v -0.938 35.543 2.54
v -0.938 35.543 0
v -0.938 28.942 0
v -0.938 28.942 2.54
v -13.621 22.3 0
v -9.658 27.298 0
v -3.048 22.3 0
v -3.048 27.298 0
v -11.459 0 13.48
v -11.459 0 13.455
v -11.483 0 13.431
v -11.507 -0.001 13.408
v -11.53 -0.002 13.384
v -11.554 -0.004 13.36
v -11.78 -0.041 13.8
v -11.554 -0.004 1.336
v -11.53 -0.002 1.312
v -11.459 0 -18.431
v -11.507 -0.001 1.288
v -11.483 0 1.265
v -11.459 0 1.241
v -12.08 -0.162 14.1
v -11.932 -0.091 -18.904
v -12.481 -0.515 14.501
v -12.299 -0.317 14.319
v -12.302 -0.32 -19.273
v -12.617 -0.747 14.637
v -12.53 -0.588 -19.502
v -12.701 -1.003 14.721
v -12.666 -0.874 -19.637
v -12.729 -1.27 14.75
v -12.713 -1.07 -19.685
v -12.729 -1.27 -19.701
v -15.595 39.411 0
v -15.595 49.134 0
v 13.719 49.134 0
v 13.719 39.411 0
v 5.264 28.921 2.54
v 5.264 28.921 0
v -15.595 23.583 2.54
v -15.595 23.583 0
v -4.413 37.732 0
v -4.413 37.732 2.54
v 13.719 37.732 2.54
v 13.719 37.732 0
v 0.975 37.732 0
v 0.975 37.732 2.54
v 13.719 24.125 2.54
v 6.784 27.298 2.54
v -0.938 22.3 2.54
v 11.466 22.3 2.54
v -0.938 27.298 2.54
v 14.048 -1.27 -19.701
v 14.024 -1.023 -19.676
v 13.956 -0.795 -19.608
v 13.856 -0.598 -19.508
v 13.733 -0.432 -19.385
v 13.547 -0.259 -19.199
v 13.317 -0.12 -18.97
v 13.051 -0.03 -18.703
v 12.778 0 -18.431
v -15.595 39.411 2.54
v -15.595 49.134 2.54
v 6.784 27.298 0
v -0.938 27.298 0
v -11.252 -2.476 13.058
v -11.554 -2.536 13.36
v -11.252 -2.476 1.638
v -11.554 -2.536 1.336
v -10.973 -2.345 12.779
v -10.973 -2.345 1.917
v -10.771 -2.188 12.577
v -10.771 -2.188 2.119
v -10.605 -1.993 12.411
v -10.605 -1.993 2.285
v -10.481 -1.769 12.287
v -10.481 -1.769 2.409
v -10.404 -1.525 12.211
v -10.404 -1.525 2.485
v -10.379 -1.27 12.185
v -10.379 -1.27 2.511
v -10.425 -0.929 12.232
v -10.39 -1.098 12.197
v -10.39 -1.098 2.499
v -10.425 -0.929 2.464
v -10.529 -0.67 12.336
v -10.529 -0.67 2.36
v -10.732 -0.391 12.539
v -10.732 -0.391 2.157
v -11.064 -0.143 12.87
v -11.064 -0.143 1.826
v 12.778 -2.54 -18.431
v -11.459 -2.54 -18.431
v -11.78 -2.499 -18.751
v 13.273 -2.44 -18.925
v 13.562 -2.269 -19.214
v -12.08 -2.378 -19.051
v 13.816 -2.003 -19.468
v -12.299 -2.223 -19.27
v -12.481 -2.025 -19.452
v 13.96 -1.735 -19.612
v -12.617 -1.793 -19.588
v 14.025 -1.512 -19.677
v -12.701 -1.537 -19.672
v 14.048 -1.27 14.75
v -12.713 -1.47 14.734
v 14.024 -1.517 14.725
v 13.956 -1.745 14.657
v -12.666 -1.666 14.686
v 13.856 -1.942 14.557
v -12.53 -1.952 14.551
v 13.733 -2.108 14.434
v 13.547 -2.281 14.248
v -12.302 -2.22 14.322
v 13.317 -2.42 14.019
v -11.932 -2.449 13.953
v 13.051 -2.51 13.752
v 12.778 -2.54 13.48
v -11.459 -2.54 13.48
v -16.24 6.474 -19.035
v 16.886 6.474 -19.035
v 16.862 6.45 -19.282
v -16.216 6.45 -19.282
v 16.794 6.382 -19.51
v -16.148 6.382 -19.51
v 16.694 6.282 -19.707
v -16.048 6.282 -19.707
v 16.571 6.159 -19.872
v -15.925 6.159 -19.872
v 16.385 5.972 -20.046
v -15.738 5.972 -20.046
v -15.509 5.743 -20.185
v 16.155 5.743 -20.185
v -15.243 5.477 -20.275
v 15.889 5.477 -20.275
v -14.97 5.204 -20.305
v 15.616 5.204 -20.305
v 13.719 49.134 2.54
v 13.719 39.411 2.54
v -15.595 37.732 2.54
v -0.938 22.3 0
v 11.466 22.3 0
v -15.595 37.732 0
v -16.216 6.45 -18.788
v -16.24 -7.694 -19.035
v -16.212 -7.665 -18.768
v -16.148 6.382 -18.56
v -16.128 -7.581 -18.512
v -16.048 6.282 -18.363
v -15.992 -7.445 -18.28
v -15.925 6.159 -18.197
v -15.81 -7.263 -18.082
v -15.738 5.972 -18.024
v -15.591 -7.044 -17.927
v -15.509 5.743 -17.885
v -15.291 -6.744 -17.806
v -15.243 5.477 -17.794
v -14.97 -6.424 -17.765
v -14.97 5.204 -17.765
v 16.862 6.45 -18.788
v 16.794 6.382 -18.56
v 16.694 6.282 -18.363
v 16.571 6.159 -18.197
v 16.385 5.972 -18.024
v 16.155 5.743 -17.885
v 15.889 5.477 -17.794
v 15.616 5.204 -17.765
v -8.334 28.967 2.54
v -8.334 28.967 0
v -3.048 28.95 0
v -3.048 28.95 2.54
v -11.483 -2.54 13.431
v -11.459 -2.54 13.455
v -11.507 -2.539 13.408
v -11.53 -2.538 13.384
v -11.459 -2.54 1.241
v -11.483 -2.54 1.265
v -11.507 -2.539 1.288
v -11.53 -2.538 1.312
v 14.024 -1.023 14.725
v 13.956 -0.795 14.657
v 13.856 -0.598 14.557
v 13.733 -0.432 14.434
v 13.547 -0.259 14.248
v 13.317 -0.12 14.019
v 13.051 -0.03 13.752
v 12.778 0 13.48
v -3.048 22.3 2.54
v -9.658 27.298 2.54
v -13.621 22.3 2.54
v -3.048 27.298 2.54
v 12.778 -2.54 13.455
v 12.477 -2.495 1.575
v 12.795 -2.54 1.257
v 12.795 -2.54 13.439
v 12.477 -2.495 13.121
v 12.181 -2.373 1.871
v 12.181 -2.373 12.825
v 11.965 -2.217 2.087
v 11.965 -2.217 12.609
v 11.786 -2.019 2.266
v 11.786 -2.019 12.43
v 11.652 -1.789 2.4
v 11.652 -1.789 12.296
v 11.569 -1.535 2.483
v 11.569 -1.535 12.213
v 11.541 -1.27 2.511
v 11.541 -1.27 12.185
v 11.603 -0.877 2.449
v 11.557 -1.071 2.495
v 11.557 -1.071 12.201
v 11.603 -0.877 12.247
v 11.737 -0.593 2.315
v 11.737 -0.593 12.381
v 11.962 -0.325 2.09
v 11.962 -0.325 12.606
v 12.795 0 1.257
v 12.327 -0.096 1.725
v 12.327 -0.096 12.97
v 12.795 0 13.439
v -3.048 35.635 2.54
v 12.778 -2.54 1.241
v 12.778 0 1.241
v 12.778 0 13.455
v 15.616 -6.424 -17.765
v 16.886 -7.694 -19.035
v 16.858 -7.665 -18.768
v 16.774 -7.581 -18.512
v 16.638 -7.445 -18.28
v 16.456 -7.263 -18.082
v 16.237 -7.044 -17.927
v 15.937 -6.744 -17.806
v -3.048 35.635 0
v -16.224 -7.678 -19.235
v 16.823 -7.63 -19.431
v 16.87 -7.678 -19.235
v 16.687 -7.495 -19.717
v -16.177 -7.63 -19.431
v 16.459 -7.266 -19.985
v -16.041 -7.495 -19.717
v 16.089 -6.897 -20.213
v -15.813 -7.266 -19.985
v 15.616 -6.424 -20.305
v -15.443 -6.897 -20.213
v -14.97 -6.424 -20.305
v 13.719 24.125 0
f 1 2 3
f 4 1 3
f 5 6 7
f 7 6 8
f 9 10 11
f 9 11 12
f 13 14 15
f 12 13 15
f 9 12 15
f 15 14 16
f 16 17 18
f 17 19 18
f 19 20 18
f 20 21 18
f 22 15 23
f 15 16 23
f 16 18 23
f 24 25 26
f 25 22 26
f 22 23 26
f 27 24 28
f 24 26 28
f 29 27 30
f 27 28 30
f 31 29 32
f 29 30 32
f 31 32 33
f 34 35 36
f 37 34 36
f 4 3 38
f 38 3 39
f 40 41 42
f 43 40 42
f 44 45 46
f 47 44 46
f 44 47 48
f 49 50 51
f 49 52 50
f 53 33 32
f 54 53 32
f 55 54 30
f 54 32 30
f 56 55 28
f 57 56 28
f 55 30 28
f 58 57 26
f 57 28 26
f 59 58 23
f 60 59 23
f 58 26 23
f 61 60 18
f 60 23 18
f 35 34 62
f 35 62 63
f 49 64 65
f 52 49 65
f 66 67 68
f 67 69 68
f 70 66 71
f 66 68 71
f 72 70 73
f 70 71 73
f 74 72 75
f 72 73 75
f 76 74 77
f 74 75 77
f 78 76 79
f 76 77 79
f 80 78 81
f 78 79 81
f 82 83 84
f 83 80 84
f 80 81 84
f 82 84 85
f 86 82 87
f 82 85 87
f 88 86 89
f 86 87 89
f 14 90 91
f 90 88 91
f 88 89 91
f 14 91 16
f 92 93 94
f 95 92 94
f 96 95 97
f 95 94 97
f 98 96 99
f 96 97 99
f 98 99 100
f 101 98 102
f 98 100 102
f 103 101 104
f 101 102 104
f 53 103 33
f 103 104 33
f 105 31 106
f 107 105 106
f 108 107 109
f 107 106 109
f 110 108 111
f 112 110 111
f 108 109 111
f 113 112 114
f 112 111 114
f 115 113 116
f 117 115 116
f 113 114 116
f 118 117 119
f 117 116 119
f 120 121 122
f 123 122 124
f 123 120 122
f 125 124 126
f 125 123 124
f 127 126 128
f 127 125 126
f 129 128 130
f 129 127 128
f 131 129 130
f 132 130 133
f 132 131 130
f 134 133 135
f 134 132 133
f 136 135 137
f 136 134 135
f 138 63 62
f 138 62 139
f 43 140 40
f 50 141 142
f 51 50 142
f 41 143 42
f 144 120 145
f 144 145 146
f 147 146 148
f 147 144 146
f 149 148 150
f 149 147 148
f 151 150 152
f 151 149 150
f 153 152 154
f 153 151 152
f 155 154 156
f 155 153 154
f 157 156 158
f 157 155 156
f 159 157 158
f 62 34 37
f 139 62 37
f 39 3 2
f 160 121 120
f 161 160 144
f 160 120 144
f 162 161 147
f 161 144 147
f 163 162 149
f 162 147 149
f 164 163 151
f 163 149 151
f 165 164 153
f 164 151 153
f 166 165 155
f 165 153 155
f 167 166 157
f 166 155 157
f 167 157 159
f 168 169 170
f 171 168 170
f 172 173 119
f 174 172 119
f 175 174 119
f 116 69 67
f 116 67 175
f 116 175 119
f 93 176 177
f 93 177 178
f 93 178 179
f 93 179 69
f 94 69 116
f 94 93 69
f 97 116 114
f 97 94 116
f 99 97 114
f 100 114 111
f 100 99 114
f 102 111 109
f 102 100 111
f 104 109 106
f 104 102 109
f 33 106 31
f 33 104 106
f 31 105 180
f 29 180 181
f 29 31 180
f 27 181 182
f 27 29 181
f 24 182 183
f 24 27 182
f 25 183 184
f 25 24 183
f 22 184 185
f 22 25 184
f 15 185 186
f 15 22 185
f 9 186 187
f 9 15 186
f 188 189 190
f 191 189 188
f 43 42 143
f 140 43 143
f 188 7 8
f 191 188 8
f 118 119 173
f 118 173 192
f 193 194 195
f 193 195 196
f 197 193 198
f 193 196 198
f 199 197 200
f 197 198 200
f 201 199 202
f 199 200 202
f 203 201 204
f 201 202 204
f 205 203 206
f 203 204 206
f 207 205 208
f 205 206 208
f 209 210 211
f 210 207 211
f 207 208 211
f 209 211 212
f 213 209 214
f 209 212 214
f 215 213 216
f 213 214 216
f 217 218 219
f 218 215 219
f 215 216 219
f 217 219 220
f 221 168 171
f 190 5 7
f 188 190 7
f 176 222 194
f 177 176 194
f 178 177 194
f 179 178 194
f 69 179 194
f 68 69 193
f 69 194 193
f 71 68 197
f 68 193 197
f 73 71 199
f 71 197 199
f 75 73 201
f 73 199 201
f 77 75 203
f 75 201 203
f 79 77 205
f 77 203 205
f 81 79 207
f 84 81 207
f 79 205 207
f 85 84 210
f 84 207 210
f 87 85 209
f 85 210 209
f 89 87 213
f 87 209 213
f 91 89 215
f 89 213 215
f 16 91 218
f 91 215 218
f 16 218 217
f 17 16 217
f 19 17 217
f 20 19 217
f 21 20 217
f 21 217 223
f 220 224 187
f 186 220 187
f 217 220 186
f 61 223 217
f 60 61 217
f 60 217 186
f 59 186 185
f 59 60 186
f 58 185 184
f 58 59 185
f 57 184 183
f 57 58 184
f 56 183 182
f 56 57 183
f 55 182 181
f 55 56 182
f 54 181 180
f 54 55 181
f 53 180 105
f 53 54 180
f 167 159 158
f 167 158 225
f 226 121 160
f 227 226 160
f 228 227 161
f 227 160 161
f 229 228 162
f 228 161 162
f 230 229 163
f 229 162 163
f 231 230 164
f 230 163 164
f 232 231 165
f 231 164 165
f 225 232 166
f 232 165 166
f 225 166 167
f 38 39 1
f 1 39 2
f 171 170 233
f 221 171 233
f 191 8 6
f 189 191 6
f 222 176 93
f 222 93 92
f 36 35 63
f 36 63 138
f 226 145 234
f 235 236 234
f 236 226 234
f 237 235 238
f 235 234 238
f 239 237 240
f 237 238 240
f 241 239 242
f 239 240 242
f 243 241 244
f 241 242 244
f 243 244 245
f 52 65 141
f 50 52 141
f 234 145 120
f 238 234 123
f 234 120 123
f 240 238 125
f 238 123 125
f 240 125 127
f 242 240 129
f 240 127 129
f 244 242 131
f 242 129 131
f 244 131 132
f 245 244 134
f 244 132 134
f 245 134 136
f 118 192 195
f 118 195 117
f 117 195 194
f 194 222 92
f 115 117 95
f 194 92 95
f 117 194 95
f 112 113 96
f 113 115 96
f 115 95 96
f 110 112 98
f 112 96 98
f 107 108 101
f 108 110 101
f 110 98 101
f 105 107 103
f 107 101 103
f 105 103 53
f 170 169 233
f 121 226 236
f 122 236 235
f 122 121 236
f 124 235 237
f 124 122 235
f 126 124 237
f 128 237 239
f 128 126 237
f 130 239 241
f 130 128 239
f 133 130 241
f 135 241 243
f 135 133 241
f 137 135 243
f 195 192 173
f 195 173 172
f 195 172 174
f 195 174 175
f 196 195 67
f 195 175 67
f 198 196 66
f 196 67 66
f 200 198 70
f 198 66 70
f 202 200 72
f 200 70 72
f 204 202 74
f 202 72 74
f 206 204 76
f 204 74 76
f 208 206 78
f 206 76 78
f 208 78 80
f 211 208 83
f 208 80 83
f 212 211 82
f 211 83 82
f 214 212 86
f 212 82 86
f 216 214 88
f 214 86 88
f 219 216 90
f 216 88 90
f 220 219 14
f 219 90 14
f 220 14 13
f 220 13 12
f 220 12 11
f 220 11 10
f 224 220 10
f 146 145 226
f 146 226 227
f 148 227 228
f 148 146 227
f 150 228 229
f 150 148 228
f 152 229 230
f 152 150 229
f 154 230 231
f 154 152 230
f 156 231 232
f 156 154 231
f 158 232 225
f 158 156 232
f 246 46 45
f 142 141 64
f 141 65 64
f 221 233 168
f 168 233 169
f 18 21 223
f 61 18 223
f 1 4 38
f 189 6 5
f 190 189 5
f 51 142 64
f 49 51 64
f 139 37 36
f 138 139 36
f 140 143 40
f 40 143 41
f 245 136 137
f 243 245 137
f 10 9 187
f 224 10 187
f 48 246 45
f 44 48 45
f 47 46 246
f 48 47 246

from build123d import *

# Parameters (mm, degrees)
F0_W          = 26.7775058746
F0_H          = 31.9101065397
F0_W_2        = 21.9197236001
F0_H_2        = 9.6741355956
F1_DEPTH      = 2.54
F2_DEPTH      = 2.54
F3_W          = 33.1266149879
F3_H          = 14.1676757485
F4_DEPTH      = 2.54
F6_W          = 29.3138232082
F6_H          = 9.7226984799
F7_DEPTH      = 2.54
F8_T1_DEPTH   = 33.1275058746
F8_T3_DEPTH   = 40.8001065397
F8_T5_DEPTH   = 9.6741355956
F8_T7_DEPTH   = 21.9197236001
F8_T13_DEPTH  = 12.8491355956
F8_T17_DEPTH  = 25.0947236001
F8_T24_DEPTH  = 12.8491355956
F8_T28_DEPTH  = 25.0947236001
F8_T35_DEPTH  = 25.0947236001
F8_T39_DEPTH  = 12.8491355956
F8_T46_DEPTH  = 12.8491355956
F8_T50_DEPTH  = 25.0947236001
F8_T57_DEPTH  = 25.0947236001
F8_T61_DEPTH  = 12.8491355956
F8_T68_DEPTH  = 25.0947236001
F8_T72_DEPTH  = 12.8491355956
F8_T79_DEPTH  = 12.8491355956
F8_T83_DEPTH  = 25.0947236001
F8_T90_DEPTH  = 25.0947236001
F8_T94_DEPTH  = 12.8491355956
F8_2_T1_DEPTH = 39.4766149879
F8_2_T3_DEPTH = 20.5176757485


# Not quite as in the source:
# - a fillet or chamfer that OpenCascade refuses, or shapes differently, is made with other operations: its cross-section is extruded or revolved along the edge and cut away or added


with BuildPart() as f1:
    # F0 (on Front) → F1 (new body)
    with BuildSketch(Plane.XZ):
        with Locations((0.6596446037, -1.20549649)):
            Rectangle(F0_W, F0_H)
        with Locations((0.5812961608, 7.34799169)):
            Rectangle(F0_W_2, F0_H_2, mode=Mode.SUBTRACT)
    extrude(amount=F1_DEPTH)

    # F2 (add): a face of the model
    f2_faces = [f1.faces().sort_by_distance(p)[0] for p in [
        (0.6596446037, -1.27, -17.1605497599),
    ]]
    extrude(f2_faces, amount=F2_DEPTH)

    # F8: fillet of radius 1.27 on 16 edges, made by hand

    # F8_s2 → F8_t1 (cut)
    with BuildSketch(Plane.YZ.offset(-15.9041083336)):
        with BuildLine():
            ThreePointArc((-1.27, 14.7495567799), (-2.1680256121, 14.377582392), (-2.54, 13.4795567799))
            Line((-2.54, 13.4795567799), (-2.54, 14.7495567799))
            Line((-2.54, 14.7495567799), (-1.27, 14.7495567799))
        make_face()
        with BuildLine():
            ThreePointArc((-2.54, -18.4305497599), (-2.1680256121, -19.328575372), (-1.27, -19.7005497599))
            Line((-1.27, -19.7005497599), (-2.54, -19.7005497599))
            Line((-2.54, -19.7005497599), (-2.54, -18.4305497599))
        make_face()
        with BuildLine():
            ThreePointArc((-1.27, 14.7495567799), (-0.3719743879, 14.377582392), (0, 13.4795567799))
            Line((0, 13.4795567799), (0, 14.7495567799))
            Line((0, 14.7495567799), (-1.27, 14.7495567799))
        make_face()
        with BuildLine():
            ThreePointArc((-1.27, -19.7005497599), (-0.3719743879, -19.328575372), (0, -18.4305497599))
            Line((0, -18.4305497599), (0, -19.7005497599))
            Line((0, -19.7005497599), (-1.27, -19.7005497599))
        make_face()
    extrude(amount=F8_T1_DEPTH, mode=Mode.SUBTRACT)

    # F8_s4 → F8_t3 (cut)
    with BuildSketch(Plane.XY.offset(-22.8755497599)):
        with BuildLine():
            ThreePointArc((-11.4591083336, -2.54), (-12.3571339457, -2.1680256121), (-12.7291083336, -1.27))
            Line((-12.7291083336, -1.27), (-12.7291083336, -2.54))
            Line((-12.7291083336, -2.54), (-11.4591083336, -2.54))
        make_face()
        with BuildLine():
            ThreePointArc((12.778397541, -2.54), (13.6764231532, -2.1680256121), (14.048397541, -1.27))
            Line((14.048397541, -1.27), (14.048397541, -2.54))
            Line((14.048397541, -2.54), (12.778397541, -2.54))
        make_face()
        with BuildLine():
            ThreePointArc((-11.4591083336, 0), (-12.3571339457, -0.3719743879), (-12.7291083336, -1.27))
            Line((-12.7291083336, -1.27), (-12.7291083336, 0))
            Line((-12.7291083336, 0), (-11.4591083336, 0))
        make_face()
        with BuildLine():
            ThreePointArc((12.778397541, 0), (13.6764231532, -0.3719743879), (14.048397541, -1.27))
            Line((14.048397541, -1.27), (14.048397541, 0))
            Line((14.048397541, 0), (12.778397541, 0))
        make_face()
    extrude(amount=F8_T3_DEPTH, mode=Mode.SUBTRACT)

    # F8_s6 → F8_t5 (cut)
    with BuildSketch(Plane.XY.offset(2.5109238923)):
        with BuildLine():
            ThreePointArc((-11.6485656393, -2.54), (-10.7505400272, -2.1680256121), (-10.3785656393, -1.27))
            Line((-10.3785656393, -1.27), (-10.3785656393, -2.54))
            Line((-10.3785656393, -2.54), (-11.6485656393, -2.54))
        make_face()
        with BuildLine():
            ThreePointArc((12.8111579609, -2.54), (11.9131323488, -2.1680256121), (11.5411579609, -1.27))
            Line((11.5411579609, -1.27), (11.5411579609, -2.54))
            Line((11.5411579609, -2.54), (12.8111579609, -2.54))
        make_face()
        with BuildLine():
            ThreePointArc((-10.3785656393, -1.27), (-10.7505400272, -0.3719743879), (-11.6485656393, 0))
            Line((-11.6485656393, 0), (-10.3785656393, 0))
            Line((-10.3785656393, 0), (-10.3785656393, -1.27))
        make_face()
        with BuildLine():
            ThreePointArc((11.5411579609, -1.27), (11.9131323488, -0.3719743879), (12.8111579609, 0))
            Line((12.8111579609, 0), (11.5411579609, 0))
            Line((11.5411579609, 0), (11.5411579609, -1.27))
        make_face()
    extrude(amount=F8_T5_DEPTH, mode=Mode.SUBTRACT)

    # F8_s8 → F8_t7 (cut)
    with BuildSketch(Plane.YZ.offset(-10.3785656393)):
        with BuildLine():
            ThreePointArc((-2.54, 13.4550594878), (-2.1680256121, 12.5570338757), (-1.27, 12.1850594878))
            Line((-1.27, 12.1850594878), (-2.54, 12.1850594878))
            Line((-2.54, 12.1850594878), (-2.54, 13.4550594878))
        make_face()
        with BuildLine():
            ThreePointArc((-2.54, 1.2409238923), (-2.1680256121, 2.1389495044), (-1.27, 2.5109238923))
            Line((-1.27, 2.5109238923), (-2.54, 2.5109238923))
            Line((-2.54, 2.5109238923), (-2.54, 1.2409238923))
        make_face()
        with BuildLine():
            ThreePointArc((-1.27, 12.1850594878), (-0.3719743879, 12.5570338757), (0, 13.4550594878))
            Line((0, 13.4550594878), (0, 12.1850594878))
            Line((0, 12.1850594878), (-1.27, 12.1850594878))
        make_face()
        with BuildLine():
            ThreePointArc((-1.27, 2.5109238923), (-0.3719743879, 2.1389495044), (0, 1.2409238923))
            Line((0, 1.2409238923), (0, 2.5109238923))
            Line((0, 2.5109238923), (-1.27, 2.5109238923))
        make_face()
    extrude(amount=F8_T7_DEPTH, mode=Mode.SUBTRACT)


with BuildPart() as f4:
    # F3 (on Top) → F4 (new body)
    with BuildSketch(Plane.XY):
        with Locations((0.3230758011, -0.609732233)):
            Rectangle(F3_W, F3_H)
    extrude(amount=F4_DEPTH)


with BuildPart() as f4_1:
    # F5: moved
    add(f4.part.moved(Location((0, 0, -20.3048437834))))

    # F8#2: fillet of radius 1.27 on 8 edges, made by hand

    # F8_2_s2 → F8_2_t1 (cut)
    with BuildSketch(Plane.YZ.offset(-19.4152316928)):
        with BuildLine():
            ThreePointArc((6.4741056412, -19.0348437834), (6.1021312534, -18.1368181713), (5.2041056412, -17.7648437834))
            Line((5.2041056412, -17.7648437834), (6.4741056412, -17.7648437834))
            Line((6.4741056412, -17.7648437834), (6.4741056412, -19.0348437834))
        make_face()
        with BuildLine():
            ThreePointArc((-7.6935701072, -19.0348437834), (-7.3215957193, -18.1368181713), (-6.4235701072, -17.7648437834))
            Line((-6.4235701072, -17.7648437834), (-7.6935701072, -17.7648437834))
            Line((-7.6935701072, -17.7648437834), (-7.6935701072, -19.0348437834))
        make_face()
        with BuildLine():
            ThreePointArc((6.4741056412, -19.0348437834), (6.1021312534, -19.9328693955), (5.2041056412, -20.3048437834))
            Line((5.2041056412, -20.3048437834), (6.4741056412, -20.3048437834))
            Line((6.4741056412, -20.3048437834), (6.4741056412, -19.0348437834))
        make_face()
        with BuildLine():
            ThreePointArc((-7.6935701072, -19.0348437834), (-7.3215957193, -19.9328693955), (-6.4235701072, -20.3048437834))
            Line((-6.4235701072, -20.3048437834), (-7.6935701072, -20.3048437834))
            Line((-7.6935701072, -20.3048437834), (-7.6935701072, -19.0348437834))
        make_face()
    extrude(amount=F8_2_T1_DEPTH, mode=Mode.SUBTRACT)

    # F8_2_s4 → F8_2_t3 (cut)
    with BuildSketch(Plane.XZ.offset(-9.6491056412)):
        with BuildLine():
            ThreePointArc((-16.2402316928, -19.0348437834), (-15.8682573049, -18.1368181713), (-14.9702316928, -17.7648437834))
            Line((-14.9702316928, -17.7648437834), (-16.2402316928, -17.7648437834))
            Line((-16.2402316928, -17.7648437834), (-16.2402316928, -19.0348437834))
        make_face()
        with BuildLine():
            ThreePointArc((16.8863832951, -19.0348437834), (16.5144089072, -18.1368181713), (15.6163832951, -17.7648437834))
            Line((15.6163832951, -17.7648437834), (16.8863832951, -17.7648437834))
            Line((16.8863832951, -17.7648437834), (16.8863832951, -19.0348437834))
        make_face()
        with BuildLine():
            ThreePointArc((-16.2402316928, -19.0348437834), (-15.8682573049, -19.9328693955), (-14.9702316928, -20.3048437834))
            Line((-14.9702316928, -20.3048437834), (-16.2402316928, -20.3048437834))
            Line((-16.2402316928, -20.3048437834), (-16.2402316928, -19.0348437834))
        make_face()
        with BuildLine():
            ThreePointArc((16.8863832951, -19.0348437834), (16.5144089072, -19.9328693955), (15.6163832951, -20.3048437834))
            Line((15.6163832951, -20.3048437834), (16.8863832951, -20.3048437834))
            Line((16.8863832951, -20.3048437834), (16.8863832951, -19.0348437834))
        make_face()
    extrude(amount=F8_2_T3_DEPTH, mode=Mode.SUBTRACT)


with BuildPart() as f7:
    # F6 (on Top) → F7 (new body)
    with BuildSketch(Plane.XY):
        with Locations((-0.937984325, 44.2727897316)):
            Rectangle(F6_W, F6_H)
    extrude(amount=F7_DEPTH)


with BuildPart() as f7b:
    # F6 (on Top) → F7, piece 2 (new body)
    with BuildSketch(Plane.XY):
        Polygon((-4.4132112525, 37.7321839333), (-15.5948959291, 37.7321839333), (-15.5948959291, 23.5834531486), align=None)
    extrude(amount=F7_DEPTH)


with BuildPart() as f7c:
    # F6 (on Top) → F7, piece 3 (new body)
    with BuildSketch(Plane.XY):
        Polygon((-3.0478241388, 28.9495810729), (-3.0478241388, 35.6352925301), (-8.334170212, 28.9674811065), align=None)
    extrude(amount=F7_DEPTH)


with BuildPart() as f7d:
    # F6 (on Top) → F7, piece 4 (new body)
    with BuildSketch(Plane.XY):
        Polygon((-9.6575162616, 27.2983089062), (-13.6205162853, 22.299669683), (-3.0478241388, 22.299669683), (-3.0478241388, 27.2983089062), align=None)
    extrude(amount=F7_DEPTH)


with BuildPart() as f7e:
    # F6 (on Top) → F7, piece 5 (new body)
    with BuildSketch(Plane.XY):
        Polygon((-0.937984325, 22.299669683), (11.4659758466, 22.299669683), (6.784225237, 27.2983089062), (-0.937984325, 27.2983089062), align=None)
    extrude(amount=F7_DEPTH)


with BuildPart() as f7f:
    # F6 (on Top) → F7, piece 6 (new body)
    with BuildSketch(Plane.XY):
        Polygon((5.2639957608, 28.9214365184), (-0.937984325, 35.5432033539), (-0.937984325, 28.9424369694), align=None)
    extrude(amount=F7_DEPTH)


with BuildPart() as f7g:
    # F6 (on Top) → F7, piece 7 (new body)
    with BuildSketch(Plane.XY):
        Polygon((13.7189272791, 24.1253394634), (13.7189272791, 37.7321839333), (0.9746883879, 37.7321839333), align=None)
    extrude(amount=F7_DEPTH)


with BuildPart() as f8_tool11:
    # F8_s12 → F8_t13 (new body)
    with BuildSketch(Plane.XY.offset(-0.6640761077)):
        with BuildLine():
            ThreePointArc((-11.6485656393, -2.54), (-10.7505400272, -2.1680256121), (-10.3785656393, -1.27))
            Line((-10.3785656393, -1.27), (-10.3785656393, -2.54))
            Line((-10.3785656393, -2.54), (-11.6485656393, -2.54))
        make_face()
    extrude(amount=F8_T13_DEPTH)

    split(bisect_by=Plane.XY.offset(2.5109238923), keep=Keep.BOTTOM)


with BuildPart() as f8_tool15:
    # F8_s16 → F8_t17 (new body)
    with BuildSketch(Plane.YZ.offset(11.5411579609)):
        with BuildLine():
            ThreePointArc((-2.54, 1.2409238923), (-2.1680256121, 2.1389495044), (-1.27, 2.5109238923))
            Line((-1.27, 2.5109238923), (-2.54, 2.5109238923))
            Line((-2.54, 2.5109238923), (-2.54, 1.2409238923))
        make_face()
    extrude(amount=-F8_T17_DEPTH)

    split(bisect_by=Plane.YZ.offset(-10.3785656393), keep=Keep.BOTTOM)


with BuildPart() as f8_tool11_1:
    add(f8_tool11.part)

    # F8_t19: intersect F8_tool15
    add(f8_tool15.part, mode=Mode.INTERSECT)


with BuildPart() as f1_1:
    add(f1.part)

    # F8_t9: cut F8_tool11
    add(f8_tool11_1.part, mode=Mode.SUBTRACT)


with BuildPart() as f8_tool22:
    # F8_s23 → F8_t24 (new body)
    with BuildSketch(Plane.XY.offset(2.5109238923)):
        with BuildLine():
            ThreePointArc((-11.6485656393, -2.54), (-10.7505400272, -2.1680256121), (-10.3785656393, -1.27))
            Line((-10.3785656393, -1.27), (-10.3785656393, -2.54))
            Line((-10.3785656393, -2.54), (-11.6485656393, -2.54))
        make_face()
    extrude(amount=F8_T24_DEPTH)

    split(bisect_by=Plane.XY.offset(12.1850594878), keep=Keep.TOP)


with BuildPart() as f8_tool26:
    # F8_s27 → F8_t28 (new body)
    with BuildSketch(Plane.YZ.offset(-13.5535656393)):
        with BuildLine():
            ThreePointArc((-2.54, 13.4550594878), (-2.1680256121, 12.5570338757), (-1.27, 12.1850594878))
            Line((-1.27, 12.1850594878), (-2.54, 12.1850594878))
            Line((-2.54, 12.1850594878), (-2.54, 13.4550594878))
        make_face()
    extrude(amount=F8_T28_DEPTH)

    split(bisect_by=Plane.YZ.offset(-10.3785656393), keep=Keep.BOTTOM)


with BuildPart() as f8_tool22_1:
    add(f8_tool22.part)

    # F8_t30: intersect F8_tool26
    add(f8_tool26.part, mode=Mode.INTERSECT)


with BuildPart() as f1_2:
    add(f1_1.part)

    # F8_t20: cut F8_tool22
    add(f8_tool22_1.part, mode=Mode.SUBTRACT)


with BuildPart() as f8_tool33:
    # F8_s34 → F8_t35 (new body)
    with BuildSketch(Plane.YZ.offset(-10.3785656393)):
        with BuildLine():
            ThreePointArc((-2.54, 13.4550594878), (-2.1680256121, 12.5570338757), (-1.27, 12.1850594878))
            Line((-1.27, 12.1850594878), (-2.54, 12.1850594878))
            Line((-2.54, 12.1850594878), (-2.54, 13.4550594878))
        make_face()
    extrude(amount=F8_T35_DEPTH)

    split(bisect_by=Plane.YZ.offset(11.5411579609), keep=Keep.TOP)


with BuildPart() as f8_tool37:
    # F8_s38 → F8_t39 (new body)
    with BuildSketch(Plane.XY.offset(15.3600594878)):
        with BuildLine():
            ThreePointArc((12.8111579609, -2.54), (11.9131323488, -2.1680256121), (11.5411579609, -1.27))
            Line((11.5411579609, -1.27), (11.5411579609, -2.54))
            Line((11.5411579609, -2.54), (12.8111579609, -2.54))
        make_face()
    extrude(amount=-F8_T39_DEPTH)

    split(bisect_by=Plane.XY.offset(12.1850594878), keep=Keep.TOP)


with BuildPart() as f8_tool33_1:
    add(f8_tool33.part)

    # F8_t41: intersect F8_tool37
    add(f8_tool37.part, mode=Mode.INTERSECT)


with BuildPart() as f1_3:
    add(f1_2.part)

    # F8_t31: cut F8_tool33
    add(f8_tool33_1.part, mode=Mode.SUBTRACT)


with BuildPart() as f8_tool44:
    # F8_s45 → F8_t46 (new body)
    with BuildSketch(Plane.XY.offset(12.1850594878)):
        with BuildLine():
            ThreePointArc((12.8111579609, -2.54), (11.9131323488, -2.1680256121), (11.5411579609, -1.27))
            Line((11.5411579609, -1.27), (11.5411579609, -2.54))
            Line((11.5411579609, -2.54), (12.8111579609, -2.54))
        make_face()
    extrude(amount=-F8_T46_DEPTH)

    split(bisect_by=Plane.XY.offset(2.5109238923), keep=Keep.BOTTOM)


with BuildPart() as f8_tool48:
    # F8_s49 → F8_t50 (new body)
    with BuildSketch(Plane.YZ.offset(14.7161579609)):
        with BuildLine():
            ThreePointArc((-2.54, 1.2409238923), (-2.1680256121, 2.1389495044), (-1.27, 2.5109238923))
            Line((-1.27, 2.5109238923), (-2.54, 2.5109238923))
            Line((-2.54, 2.5109238923), (-2.54, 1.2409238923))
        make_face()
    extrude(amount=-F8_T50_DEPTH)

    split(bisect_by=Plane.YZ.offset(11.5411579609), keep=Keep.TOP)


with BuildPart() as f8_tool44_1:
    add(f8_tool44.part)

    # F8_t52: intersect F8_tool48
    add(f8_tool48.part, mode=Mode.INTERSECT)


with BuildPart() as f1_4:
    add(f1_3.part)

    # F8_t42: cut F8_tool44
    add(f8_tool44_1.part, mode=Mode.SUBTRACT)


with BuildPart() as f8_tool55:
    # F8_s56 → F8_t57 (new body)
    with BuildSketch(Plane.YZ.offset(11.5411579609)):
        with BuildLine():
            ThreePointArc((-1.27, 2.5109238923), (-0.3719743879, 2.1389495044), (0, 1.2409238923))
            Line((0, 1.2409238923), (0, 2.5109238923))
            Line((0, 2.5109238923), (-1.27, 2.5109238923))
        make_face()
    extrude(amount=-F8_T57_DEPTH)

    split(bisect_by=Plane.YZ.offset(-10.3785656393), keep=Keep.BOTTOM)


with BuildPart() as f8_tool59:
    # F8_s60 → F8_t61 (new body)
    with BuildSketch(Plane.XY.offset(-0.6640761077)):
        with BuildLine():
            ThreePointArc((-10.3785656393, -1.27), (-10.7505400272, -0.3719743879), (-11.6485656393, 0))
            Line((-11.6485656393, 0), (-10.3785656393, 0))
            Line((-10.3785656393, 0), (-10.3785656393, -1.27))
        make_face()
    extrude(amount=F8_T61_DEPTH)

    split(bisect_by=Plane.XY.offset(2.5109238923), keep=Keep.BOTTOM)


with BuildPart() as f8_tool55_1:
    add(f8_tool55.part)

    # F8_t63: intersect F8_tool59
    add(f8_tool59.part, mode=Mode.INTERSECT)


with BuildPart() as f1_5:
    add(f1_4.part)

    # F8_t53: cut F8_tool55
    add(f8_tool55_1.part, mode=Mode.SUBTRACT)


with BuildPart() as f8_tool66:
    # F8_s67 → F8_t68 (new body)
    with BuildSketch(Plane.YZ.offset(-13.5535656393)):
        with BuildLine():
            ThreePointArc((-1.27, 12.1850594878), (-0.3719743879, 12.5570338757), (0, 13.4550594878))
            Line((0, 13.4550594878), (0, 12.1850594878))
            Line((0, 12.1850594878), (-1.27, 12.1850594878))
        make_face()
    extrude(amount=F8_T68_DEPTH)

    split(bisect_by=Plane.YZ.offset(-10.3785656393), keep=Keep.BOTTOM)


with BuildPart() as f8_tool70:
    # F8_s71 → F8_t72 (new body)
    with BuildSketch(Plane.XY.offset(2.5109238923)):
        with BuildLine():
            ThreePointArc((-10.3785656393, -1.27), (-10.7505400272, -0.3719743879), (-11.6485656393, 0))
            Line((-11.6485656393, 0), (-10.3785656393, 0))
            Line((-10.3785656393, 0), (-10.3785656393, -1.27))
        make_face()
    extrude(amount=F8_T72_DEPTH)

    split(bisect_by=Plane.XY.offset(12.1850594878), keep=Keep.TOP)


with BuildPart() as f8_tool66_1:
    add(f8_tool66.part)

    # F8_t74: intersect F8_tool70
    add(f8_tool70.part, mode=Mode.INTERSECT)


with BuildPart() as f1_6:
    add(f1_5.part)

    # F8_t64: cut F8_tool66
    add(f8_tool66_1.part, mode=Mode.SUBTRACT)


with BuildPart() as f8_tool77:
    # F8_s78 → F8_t79 (new body)
    with BuildSketch(Plane.XY.offset(15.3600594878)):
        with BuildLine():
            ThreePointArc((11.5411579609, -1.27), (11.9131323488, -0.3719743879), (12.8111579609, 0))
            Line((12.8111579609, 0), (11.5411579609, 0))
            Line((11.5411579609, 0), (11.5411579609, -1.27))
        make_face()
    extrude(amount=-F8_T79_DEPTH)

    split(bisect_by=Plane.XY.offset(12.1850594878), keep=Keep.TOP)


with BuildPart() as f8_tool81:
    # F8_s82 → F8_t83 (new body)
    with BuildSketch(Plane.YZ.offset(-10.3785656393)):
        with BuildLine():
            ThreePointArc((-1.27, 12.1850594878), (-0.3719743879, 12.5570338757), (0, 13.4550594878))
            Line((0, 13.4550594878), (0, 12.1850594878))
            Line((0, 12.1850594878), (-1.27, 12.1850594878))
        make_face()
    extrude(amount=F8_T83_DEPTH)

    split(bisect_by=Plane.YZ.offset(11.5411579609), keep=Keep.TOP)


with BuildPart() as f8_tool77_1:
    add(f8_tool77.part)

    # F8_t85: intersect F8_tool81
    add(f8_tool81.part, mode=Mode.INTERSECT)


with BuildPart() as f1_7:
    add(f1_6.part)

    # F8_t75: cut F8_tool77
    add(f8_tool77_1.part, mode=Mode.SUBTRACT)


with BuildPart() as f8_tool88:
    # F8_s89 → F8_t90 (new body)
    with BuildSketch(Plane.YZ.offset(14.7161579609)):
        with BuildLine():
            ThreePointArc((-1.27, 2.5109238923), (-0.3719743879, 2.1389495044), (0, 1.2409238923))
            Line((0, 1.2409238923), (0, 2.5109238923))
            Line((0, 2.5109238923), (-1.27, 2.5109238923))
        make_face()
    extrude(amount=-F8_T90_DEPTH)

    split(bisect_by=Plane.YZ.offset(11.5411579609), keep=Keep.TOP)


with BuildPart() as f8_tool92:
    # F8_s93 → F8_t94 (new body)
    with BuildSketch(Plane.XY.offset(12.1850594878)):
        with BuildLine():
            ThreePointArc((11.5411579609, -1.27), (11.9131323488, -0.3719743879), (12.8111579609, 0))
            Line((12.8111579609, 0), (11.5411579609, 0))
            Line((11.5411579609, 0), (11.5411579609, -1.27))
        make_face()
    extrude(amount=-F8_T94_DEPTH)

    split(bisect_by=Plane.XY.offset(2.5109238923), keep=Keep.BOTTOM)


with BuildPart() as f8_tool88_1:
    add(f8_tool88.part)

    # F8_t96: intersect F8_tool92
    add(f8_tool92.part, mode=Mode.INTERSECT)


with BuildPart() as f1_8:
    add(f1_7.part)

    # F8_t86: cut F8_tool88
    add(f8_tool88_1.part, mode=Mode.SUBTRACT)


solid = Compound([f4_1.part, f7.part, f7b.part, f7c.part, f7d.part, f7e.part, f7f.part, f7g.part, f1_8.part])
